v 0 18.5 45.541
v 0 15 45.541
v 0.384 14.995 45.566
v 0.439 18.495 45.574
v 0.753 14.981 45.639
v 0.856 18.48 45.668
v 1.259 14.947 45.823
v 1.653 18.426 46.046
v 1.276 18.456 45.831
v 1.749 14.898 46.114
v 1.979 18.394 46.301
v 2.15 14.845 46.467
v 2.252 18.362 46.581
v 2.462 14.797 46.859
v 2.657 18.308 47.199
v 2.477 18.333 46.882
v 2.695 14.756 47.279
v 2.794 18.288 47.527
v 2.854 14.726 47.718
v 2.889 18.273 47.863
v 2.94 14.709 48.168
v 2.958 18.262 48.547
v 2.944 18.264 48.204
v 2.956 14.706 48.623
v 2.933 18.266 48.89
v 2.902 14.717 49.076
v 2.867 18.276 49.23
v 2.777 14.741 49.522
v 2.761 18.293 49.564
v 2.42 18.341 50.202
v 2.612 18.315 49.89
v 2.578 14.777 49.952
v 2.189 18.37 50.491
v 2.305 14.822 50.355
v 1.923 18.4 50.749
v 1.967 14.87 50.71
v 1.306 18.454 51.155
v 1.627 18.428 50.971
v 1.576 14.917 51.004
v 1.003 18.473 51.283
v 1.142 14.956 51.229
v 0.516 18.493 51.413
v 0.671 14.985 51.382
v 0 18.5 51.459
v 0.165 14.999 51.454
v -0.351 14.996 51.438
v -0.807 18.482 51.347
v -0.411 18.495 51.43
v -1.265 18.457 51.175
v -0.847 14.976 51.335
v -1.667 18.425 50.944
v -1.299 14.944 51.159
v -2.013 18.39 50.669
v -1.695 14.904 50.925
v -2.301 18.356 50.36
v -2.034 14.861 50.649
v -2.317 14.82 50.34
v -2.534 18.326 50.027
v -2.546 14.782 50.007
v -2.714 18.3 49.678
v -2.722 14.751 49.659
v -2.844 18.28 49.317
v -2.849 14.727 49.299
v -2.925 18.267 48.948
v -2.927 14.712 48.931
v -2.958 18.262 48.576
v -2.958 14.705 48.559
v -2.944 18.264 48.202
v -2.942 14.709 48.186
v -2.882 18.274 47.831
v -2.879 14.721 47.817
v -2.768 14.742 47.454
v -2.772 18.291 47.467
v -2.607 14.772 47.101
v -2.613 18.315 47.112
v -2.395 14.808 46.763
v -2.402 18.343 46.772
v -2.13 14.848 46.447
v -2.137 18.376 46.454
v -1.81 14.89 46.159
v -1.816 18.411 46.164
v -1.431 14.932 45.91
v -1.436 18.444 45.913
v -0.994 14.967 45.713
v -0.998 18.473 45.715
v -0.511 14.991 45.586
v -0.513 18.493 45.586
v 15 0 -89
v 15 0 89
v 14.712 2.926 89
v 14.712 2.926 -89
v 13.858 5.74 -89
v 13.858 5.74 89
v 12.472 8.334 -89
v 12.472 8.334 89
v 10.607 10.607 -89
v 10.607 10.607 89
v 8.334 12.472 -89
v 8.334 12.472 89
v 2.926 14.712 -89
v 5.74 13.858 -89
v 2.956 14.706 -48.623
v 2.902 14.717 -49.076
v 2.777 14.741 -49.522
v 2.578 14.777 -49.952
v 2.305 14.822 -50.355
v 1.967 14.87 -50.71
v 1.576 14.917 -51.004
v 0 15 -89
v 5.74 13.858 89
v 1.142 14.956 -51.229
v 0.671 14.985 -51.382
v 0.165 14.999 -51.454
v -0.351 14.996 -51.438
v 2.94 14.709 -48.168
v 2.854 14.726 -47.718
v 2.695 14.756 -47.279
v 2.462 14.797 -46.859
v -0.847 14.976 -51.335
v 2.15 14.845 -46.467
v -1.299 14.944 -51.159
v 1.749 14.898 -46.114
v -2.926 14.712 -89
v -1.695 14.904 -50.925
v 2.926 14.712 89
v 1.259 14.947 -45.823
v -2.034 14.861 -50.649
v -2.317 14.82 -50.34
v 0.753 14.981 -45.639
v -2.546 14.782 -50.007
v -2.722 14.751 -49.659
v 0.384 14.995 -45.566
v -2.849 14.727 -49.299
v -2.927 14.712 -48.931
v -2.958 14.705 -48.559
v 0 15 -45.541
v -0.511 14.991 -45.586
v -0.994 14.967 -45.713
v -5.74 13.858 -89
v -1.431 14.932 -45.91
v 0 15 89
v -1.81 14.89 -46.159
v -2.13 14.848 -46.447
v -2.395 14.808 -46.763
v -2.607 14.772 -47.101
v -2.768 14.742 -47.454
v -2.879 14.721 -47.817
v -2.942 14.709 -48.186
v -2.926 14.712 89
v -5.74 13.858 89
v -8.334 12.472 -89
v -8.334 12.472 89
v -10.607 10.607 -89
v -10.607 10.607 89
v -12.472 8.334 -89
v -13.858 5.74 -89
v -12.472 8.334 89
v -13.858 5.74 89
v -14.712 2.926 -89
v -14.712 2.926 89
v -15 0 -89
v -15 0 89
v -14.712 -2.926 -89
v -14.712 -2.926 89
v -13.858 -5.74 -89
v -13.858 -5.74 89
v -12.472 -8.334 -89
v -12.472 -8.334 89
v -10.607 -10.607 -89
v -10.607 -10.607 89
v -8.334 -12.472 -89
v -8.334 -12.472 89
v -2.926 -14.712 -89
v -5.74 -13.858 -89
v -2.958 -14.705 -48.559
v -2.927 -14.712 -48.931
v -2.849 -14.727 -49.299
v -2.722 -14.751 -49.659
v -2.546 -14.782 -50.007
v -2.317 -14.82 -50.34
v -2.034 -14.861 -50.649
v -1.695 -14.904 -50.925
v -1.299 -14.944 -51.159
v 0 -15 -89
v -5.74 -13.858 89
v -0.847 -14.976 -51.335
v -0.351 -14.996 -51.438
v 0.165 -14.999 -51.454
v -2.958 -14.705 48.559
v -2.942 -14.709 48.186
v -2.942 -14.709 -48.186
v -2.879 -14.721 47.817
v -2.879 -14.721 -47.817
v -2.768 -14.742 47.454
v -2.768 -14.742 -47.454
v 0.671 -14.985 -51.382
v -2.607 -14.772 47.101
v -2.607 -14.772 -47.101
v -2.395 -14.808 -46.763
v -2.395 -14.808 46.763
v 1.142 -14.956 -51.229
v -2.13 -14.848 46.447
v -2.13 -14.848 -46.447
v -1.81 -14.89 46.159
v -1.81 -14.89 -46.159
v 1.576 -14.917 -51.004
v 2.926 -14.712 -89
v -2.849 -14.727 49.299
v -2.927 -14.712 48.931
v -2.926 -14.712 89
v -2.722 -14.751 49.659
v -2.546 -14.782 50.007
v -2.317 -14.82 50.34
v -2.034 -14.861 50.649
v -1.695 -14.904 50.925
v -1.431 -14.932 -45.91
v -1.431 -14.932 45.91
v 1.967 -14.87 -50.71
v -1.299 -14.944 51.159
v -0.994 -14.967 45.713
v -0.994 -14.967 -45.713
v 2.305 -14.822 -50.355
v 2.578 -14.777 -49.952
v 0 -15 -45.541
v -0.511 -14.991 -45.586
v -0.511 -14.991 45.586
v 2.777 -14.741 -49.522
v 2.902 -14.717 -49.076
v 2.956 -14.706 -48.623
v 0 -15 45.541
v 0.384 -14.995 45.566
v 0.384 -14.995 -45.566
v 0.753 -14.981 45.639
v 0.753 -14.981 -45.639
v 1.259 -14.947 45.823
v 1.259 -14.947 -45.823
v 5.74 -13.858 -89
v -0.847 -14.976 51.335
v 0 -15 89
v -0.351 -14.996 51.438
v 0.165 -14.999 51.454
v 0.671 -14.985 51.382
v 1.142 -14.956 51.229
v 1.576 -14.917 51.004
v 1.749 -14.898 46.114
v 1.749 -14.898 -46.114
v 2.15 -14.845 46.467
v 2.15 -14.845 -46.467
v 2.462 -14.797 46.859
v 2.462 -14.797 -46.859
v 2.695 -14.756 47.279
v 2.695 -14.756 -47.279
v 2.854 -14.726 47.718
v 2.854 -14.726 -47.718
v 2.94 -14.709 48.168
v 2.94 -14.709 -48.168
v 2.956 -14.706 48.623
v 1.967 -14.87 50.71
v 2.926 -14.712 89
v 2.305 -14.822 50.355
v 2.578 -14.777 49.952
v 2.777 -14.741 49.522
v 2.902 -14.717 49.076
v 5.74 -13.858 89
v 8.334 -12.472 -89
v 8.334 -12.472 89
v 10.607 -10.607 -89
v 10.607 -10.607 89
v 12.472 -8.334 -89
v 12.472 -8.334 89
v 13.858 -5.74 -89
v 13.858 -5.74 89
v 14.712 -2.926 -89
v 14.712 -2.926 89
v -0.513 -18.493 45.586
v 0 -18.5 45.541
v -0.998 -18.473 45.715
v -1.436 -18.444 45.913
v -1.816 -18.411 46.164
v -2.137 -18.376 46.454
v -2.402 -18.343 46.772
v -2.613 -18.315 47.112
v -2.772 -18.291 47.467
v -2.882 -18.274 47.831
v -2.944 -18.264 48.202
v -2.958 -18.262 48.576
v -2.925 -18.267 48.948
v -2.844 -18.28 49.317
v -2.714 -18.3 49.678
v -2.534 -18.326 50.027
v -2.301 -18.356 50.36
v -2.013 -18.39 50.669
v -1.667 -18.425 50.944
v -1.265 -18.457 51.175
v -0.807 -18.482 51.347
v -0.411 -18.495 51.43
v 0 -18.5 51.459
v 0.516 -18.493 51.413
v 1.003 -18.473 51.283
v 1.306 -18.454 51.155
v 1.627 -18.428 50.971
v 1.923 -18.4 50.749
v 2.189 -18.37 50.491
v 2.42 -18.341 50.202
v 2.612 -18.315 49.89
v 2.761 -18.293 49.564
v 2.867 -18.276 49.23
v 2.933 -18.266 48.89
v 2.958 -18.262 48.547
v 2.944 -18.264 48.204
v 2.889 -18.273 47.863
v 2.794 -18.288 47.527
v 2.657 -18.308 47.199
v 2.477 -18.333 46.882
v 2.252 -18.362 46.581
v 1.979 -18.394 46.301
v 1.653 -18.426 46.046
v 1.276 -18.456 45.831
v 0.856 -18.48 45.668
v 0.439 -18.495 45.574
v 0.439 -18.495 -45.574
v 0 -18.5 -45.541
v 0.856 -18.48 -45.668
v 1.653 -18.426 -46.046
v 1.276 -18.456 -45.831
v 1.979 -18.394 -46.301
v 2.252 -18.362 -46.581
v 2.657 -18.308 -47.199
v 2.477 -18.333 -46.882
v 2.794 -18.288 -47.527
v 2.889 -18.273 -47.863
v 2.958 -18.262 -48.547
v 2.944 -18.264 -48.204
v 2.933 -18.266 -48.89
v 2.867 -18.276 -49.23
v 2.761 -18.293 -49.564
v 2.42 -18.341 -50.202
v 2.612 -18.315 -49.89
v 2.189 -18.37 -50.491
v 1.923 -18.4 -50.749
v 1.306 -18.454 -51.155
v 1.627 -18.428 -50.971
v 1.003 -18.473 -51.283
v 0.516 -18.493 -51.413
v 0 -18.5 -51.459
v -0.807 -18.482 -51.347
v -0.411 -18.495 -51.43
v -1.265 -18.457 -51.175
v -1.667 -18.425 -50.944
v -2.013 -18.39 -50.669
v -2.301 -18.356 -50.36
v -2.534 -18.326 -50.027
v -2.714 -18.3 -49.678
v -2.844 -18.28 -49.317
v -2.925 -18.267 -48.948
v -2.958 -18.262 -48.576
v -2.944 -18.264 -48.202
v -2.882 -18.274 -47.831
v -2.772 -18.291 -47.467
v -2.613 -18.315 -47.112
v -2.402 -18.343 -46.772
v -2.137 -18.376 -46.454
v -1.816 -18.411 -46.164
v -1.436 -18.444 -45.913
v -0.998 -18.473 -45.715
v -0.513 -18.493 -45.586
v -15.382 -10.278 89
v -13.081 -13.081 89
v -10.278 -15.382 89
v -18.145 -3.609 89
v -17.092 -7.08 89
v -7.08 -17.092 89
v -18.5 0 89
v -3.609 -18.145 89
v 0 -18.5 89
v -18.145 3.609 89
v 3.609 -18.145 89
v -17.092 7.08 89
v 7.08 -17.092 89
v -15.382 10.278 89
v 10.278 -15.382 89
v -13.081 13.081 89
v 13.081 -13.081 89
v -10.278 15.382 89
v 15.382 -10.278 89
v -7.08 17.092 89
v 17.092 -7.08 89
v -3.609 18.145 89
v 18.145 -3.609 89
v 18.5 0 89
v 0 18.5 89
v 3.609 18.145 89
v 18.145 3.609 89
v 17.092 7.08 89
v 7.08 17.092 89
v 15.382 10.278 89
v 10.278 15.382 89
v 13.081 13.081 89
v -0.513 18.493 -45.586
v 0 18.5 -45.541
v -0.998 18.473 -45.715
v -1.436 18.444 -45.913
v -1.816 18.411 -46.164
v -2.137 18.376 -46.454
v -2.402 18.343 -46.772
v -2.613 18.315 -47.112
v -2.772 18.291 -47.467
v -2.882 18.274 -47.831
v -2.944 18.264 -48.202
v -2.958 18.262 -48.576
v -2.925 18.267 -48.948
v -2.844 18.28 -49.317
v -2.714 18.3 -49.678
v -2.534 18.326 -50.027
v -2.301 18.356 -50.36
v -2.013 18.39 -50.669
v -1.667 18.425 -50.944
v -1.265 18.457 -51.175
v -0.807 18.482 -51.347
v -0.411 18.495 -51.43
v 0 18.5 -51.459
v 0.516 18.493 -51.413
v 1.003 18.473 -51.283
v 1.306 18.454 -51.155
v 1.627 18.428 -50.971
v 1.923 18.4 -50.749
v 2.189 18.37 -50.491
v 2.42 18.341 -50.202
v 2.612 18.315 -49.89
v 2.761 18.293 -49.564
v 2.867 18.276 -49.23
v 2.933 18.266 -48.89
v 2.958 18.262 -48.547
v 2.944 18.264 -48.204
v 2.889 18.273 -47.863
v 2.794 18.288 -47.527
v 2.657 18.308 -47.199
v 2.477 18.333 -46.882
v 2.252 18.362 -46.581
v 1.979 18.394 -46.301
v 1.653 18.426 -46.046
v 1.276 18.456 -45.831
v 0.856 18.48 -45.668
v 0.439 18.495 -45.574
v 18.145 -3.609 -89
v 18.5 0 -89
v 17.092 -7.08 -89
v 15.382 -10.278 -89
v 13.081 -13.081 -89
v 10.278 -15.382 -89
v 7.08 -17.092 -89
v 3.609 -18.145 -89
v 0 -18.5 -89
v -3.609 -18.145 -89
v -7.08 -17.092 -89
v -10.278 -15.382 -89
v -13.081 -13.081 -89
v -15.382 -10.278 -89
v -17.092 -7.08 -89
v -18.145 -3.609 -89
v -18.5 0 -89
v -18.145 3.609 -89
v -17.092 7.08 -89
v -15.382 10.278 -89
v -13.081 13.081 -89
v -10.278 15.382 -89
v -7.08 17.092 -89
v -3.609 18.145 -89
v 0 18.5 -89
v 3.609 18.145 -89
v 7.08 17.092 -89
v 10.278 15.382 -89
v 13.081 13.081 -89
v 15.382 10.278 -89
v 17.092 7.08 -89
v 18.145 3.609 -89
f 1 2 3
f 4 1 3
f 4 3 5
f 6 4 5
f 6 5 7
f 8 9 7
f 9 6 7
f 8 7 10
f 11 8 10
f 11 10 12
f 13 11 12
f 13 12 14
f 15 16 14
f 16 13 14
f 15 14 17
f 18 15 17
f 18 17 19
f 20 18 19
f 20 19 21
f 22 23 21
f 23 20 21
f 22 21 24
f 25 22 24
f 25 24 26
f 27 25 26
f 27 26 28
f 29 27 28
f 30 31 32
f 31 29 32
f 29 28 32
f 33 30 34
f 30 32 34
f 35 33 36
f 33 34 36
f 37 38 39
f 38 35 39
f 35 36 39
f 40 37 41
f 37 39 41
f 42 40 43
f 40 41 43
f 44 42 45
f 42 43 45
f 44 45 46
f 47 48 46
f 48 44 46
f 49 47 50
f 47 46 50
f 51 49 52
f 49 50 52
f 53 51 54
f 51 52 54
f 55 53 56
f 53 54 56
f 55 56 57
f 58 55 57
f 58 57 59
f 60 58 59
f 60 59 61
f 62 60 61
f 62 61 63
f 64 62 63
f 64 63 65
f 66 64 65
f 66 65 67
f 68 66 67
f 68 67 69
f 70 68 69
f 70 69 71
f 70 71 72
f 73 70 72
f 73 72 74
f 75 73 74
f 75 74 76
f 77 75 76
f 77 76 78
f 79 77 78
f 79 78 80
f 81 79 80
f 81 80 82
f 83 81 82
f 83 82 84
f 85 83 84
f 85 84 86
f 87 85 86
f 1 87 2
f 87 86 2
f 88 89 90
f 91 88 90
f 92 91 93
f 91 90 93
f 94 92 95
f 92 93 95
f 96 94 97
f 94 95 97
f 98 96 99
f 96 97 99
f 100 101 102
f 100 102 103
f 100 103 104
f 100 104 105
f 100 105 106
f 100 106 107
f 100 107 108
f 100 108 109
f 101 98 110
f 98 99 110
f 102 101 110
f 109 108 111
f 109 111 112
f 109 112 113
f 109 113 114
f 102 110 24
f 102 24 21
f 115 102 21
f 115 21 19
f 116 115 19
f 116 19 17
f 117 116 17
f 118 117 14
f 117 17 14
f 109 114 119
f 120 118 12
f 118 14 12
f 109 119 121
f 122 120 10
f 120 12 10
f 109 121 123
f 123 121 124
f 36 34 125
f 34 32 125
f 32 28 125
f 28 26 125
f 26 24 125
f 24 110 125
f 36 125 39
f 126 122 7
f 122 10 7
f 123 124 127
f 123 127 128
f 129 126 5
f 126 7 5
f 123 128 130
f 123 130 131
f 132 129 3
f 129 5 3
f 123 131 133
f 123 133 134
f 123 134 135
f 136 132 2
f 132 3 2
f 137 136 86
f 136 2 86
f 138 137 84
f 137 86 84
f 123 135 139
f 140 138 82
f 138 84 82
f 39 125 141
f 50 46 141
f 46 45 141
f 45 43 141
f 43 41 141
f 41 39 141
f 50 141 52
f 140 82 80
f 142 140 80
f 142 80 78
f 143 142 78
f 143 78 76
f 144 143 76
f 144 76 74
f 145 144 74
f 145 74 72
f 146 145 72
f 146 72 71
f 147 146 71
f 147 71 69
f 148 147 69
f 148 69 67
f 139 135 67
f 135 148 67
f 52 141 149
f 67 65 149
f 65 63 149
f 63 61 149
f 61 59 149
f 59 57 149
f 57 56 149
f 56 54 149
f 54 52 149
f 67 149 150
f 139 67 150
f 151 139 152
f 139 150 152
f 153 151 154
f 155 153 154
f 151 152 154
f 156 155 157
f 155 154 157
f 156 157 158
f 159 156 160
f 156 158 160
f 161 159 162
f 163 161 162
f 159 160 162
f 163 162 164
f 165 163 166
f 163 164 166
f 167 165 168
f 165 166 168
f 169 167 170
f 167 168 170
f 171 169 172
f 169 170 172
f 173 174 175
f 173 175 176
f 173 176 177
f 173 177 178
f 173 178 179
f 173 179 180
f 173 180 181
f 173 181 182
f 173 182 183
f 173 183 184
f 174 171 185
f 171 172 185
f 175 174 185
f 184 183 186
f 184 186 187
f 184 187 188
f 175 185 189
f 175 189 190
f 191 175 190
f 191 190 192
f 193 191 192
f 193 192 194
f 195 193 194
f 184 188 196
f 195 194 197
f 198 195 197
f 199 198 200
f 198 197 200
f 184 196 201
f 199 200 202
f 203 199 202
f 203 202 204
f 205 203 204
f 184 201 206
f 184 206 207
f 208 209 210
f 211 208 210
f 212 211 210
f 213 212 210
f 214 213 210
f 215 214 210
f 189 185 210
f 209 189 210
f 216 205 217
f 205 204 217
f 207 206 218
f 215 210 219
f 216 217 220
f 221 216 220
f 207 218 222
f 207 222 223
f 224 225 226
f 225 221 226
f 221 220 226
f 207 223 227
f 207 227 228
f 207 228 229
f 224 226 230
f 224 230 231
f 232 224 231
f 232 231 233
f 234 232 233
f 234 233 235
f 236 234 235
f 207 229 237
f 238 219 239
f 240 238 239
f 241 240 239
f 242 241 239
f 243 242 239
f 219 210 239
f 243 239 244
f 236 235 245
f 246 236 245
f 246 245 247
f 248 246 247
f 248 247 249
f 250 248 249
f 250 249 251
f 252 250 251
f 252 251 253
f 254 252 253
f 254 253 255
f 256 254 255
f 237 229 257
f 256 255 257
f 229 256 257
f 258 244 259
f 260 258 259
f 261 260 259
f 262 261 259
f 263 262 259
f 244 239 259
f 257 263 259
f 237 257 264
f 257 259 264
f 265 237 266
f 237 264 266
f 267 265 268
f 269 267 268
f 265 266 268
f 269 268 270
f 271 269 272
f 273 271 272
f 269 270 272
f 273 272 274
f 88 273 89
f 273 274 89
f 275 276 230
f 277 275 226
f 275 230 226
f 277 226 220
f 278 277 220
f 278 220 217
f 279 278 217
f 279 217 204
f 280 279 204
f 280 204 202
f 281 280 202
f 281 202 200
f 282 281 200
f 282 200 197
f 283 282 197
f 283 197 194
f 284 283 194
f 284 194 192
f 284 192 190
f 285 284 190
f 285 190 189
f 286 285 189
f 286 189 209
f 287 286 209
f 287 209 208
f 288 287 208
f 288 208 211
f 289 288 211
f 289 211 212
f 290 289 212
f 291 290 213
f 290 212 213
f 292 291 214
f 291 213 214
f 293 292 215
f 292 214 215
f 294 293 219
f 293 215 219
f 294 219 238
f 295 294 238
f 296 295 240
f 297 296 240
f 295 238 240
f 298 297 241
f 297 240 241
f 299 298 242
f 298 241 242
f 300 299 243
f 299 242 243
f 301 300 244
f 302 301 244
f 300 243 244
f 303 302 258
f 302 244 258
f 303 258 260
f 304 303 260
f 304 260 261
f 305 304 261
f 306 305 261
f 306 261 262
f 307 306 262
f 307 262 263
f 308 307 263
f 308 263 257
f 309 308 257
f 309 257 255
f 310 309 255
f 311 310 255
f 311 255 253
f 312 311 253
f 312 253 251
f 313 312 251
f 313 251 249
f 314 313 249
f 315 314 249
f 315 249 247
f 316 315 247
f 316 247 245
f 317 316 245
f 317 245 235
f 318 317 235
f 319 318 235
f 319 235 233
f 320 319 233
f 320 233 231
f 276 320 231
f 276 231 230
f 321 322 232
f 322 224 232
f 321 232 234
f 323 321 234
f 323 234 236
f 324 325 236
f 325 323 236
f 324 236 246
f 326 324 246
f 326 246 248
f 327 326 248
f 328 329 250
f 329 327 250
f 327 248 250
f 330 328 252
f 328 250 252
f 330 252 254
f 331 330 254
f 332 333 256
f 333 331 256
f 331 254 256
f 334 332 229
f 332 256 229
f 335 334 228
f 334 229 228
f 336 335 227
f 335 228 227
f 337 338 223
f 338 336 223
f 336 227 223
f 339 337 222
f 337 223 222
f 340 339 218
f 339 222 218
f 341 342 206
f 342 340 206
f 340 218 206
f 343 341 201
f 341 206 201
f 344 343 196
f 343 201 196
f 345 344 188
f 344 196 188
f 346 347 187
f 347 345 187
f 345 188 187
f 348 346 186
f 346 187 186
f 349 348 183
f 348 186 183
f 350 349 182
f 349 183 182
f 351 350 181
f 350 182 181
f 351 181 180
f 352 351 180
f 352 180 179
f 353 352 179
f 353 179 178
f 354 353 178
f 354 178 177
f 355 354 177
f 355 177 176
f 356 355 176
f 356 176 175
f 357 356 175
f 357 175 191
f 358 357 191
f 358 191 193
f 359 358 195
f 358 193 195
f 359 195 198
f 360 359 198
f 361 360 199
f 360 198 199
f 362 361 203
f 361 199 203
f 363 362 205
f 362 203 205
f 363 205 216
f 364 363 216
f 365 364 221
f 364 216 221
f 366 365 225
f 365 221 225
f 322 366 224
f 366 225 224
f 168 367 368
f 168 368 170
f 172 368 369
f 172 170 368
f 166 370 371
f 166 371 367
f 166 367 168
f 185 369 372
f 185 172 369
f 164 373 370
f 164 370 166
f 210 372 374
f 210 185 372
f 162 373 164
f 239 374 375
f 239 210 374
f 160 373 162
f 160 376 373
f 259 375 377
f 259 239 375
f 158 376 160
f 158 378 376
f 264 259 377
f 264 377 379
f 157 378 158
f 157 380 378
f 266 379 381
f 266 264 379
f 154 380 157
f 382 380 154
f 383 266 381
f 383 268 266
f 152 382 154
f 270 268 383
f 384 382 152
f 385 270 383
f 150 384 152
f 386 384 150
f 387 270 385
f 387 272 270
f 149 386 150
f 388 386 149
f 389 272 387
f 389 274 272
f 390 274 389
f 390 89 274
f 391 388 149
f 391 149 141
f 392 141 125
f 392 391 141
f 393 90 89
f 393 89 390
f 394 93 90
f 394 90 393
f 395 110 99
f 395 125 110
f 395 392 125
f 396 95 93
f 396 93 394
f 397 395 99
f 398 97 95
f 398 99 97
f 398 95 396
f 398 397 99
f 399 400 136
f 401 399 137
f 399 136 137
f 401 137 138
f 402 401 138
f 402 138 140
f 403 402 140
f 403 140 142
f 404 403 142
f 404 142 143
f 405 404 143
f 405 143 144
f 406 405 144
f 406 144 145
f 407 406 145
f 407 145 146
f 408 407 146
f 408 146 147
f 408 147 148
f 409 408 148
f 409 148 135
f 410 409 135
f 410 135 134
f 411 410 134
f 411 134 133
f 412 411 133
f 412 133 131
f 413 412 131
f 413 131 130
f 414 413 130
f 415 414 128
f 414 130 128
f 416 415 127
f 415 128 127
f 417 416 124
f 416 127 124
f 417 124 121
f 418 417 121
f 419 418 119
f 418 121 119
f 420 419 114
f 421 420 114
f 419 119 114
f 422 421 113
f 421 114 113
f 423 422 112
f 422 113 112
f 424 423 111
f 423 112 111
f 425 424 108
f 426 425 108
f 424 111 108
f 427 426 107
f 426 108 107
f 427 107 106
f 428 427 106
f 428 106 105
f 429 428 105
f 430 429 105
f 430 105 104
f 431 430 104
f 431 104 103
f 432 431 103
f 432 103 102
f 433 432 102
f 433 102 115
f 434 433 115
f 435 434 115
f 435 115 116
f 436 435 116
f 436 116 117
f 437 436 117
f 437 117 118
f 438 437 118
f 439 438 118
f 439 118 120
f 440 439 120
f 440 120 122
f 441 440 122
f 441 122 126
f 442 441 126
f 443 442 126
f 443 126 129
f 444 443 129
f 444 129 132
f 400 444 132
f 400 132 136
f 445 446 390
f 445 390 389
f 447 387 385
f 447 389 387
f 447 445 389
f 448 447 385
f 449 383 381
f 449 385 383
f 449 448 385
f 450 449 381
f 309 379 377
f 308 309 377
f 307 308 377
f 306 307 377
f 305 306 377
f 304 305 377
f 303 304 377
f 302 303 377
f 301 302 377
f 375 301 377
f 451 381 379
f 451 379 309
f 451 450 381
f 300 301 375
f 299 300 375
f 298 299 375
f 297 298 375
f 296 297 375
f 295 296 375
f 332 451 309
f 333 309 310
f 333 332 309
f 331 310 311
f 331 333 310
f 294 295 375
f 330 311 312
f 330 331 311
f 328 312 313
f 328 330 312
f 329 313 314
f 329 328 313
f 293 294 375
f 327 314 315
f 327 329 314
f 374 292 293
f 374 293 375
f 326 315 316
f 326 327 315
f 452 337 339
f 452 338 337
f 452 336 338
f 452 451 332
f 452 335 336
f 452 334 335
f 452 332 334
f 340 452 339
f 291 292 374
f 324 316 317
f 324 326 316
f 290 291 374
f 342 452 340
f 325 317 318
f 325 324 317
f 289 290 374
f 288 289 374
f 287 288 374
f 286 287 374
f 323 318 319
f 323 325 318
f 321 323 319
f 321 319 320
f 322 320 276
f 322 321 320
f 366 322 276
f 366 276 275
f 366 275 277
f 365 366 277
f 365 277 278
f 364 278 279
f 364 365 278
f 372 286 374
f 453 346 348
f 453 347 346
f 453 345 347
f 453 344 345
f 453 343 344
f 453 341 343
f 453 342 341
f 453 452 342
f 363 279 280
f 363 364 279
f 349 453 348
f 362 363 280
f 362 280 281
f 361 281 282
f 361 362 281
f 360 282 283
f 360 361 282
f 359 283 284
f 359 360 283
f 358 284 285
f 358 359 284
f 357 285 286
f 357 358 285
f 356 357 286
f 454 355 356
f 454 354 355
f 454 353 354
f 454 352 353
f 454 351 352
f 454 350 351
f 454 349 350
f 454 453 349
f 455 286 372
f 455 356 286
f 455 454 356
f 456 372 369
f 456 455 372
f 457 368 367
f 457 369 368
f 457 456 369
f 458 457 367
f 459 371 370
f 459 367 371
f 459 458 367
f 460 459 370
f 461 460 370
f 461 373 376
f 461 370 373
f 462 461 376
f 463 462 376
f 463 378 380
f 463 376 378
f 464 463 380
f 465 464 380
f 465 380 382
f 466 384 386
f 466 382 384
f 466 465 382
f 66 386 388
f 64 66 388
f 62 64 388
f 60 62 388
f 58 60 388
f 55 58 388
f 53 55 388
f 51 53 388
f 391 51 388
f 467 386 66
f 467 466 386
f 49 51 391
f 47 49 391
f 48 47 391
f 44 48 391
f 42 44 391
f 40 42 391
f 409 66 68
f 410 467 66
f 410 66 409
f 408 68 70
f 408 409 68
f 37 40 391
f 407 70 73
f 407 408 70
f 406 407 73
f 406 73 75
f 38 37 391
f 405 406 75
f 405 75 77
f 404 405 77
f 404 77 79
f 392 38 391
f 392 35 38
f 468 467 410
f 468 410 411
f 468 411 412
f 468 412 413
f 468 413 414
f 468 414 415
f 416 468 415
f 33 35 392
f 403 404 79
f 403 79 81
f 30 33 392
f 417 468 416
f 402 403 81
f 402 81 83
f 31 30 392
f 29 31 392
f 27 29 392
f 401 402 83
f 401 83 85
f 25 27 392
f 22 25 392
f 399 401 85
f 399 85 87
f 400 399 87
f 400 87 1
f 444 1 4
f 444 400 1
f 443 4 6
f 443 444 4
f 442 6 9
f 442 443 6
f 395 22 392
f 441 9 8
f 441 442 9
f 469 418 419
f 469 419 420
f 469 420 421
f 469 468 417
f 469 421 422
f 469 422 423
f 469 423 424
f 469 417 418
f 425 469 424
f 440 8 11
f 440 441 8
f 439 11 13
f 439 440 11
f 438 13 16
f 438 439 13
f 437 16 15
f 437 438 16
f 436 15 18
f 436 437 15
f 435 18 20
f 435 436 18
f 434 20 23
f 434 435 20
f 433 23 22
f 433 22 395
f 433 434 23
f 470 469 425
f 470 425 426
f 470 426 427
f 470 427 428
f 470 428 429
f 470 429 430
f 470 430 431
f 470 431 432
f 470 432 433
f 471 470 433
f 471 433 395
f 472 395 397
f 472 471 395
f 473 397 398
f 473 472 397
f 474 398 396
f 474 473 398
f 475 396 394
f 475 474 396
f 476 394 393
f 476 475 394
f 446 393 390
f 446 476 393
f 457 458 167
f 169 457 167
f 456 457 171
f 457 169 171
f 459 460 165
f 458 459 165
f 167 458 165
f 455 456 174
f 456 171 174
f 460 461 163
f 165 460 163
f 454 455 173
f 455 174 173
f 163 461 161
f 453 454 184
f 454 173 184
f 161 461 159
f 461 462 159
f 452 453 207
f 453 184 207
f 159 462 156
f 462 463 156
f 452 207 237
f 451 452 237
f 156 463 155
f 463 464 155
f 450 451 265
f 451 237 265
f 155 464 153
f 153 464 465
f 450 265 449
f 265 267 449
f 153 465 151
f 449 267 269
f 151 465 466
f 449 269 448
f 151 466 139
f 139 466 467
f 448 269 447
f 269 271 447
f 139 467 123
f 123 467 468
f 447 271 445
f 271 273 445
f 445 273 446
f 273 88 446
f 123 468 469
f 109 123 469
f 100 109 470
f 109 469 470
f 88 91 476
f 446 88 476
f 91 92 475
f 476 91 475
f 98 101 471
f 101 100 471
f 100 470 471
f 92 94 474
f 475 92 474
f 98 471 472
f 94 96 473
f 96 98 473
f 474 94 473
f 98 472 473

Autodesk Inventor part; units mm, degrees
ref_plane "YZ Plane" through (0, 0, 0) normal (1, 0, 0) x (0, 1, 0)
ref_plane "XZ Plane" through (0, 0, 0) normal (0, 1, 0) x (-1, 0, 0)
sketch "Sketch1" plane through (0, 0, 0) normal (0, 0, 1) x (1, 0, 0)
  circle A0 centre (0, 0) radius 18.5
  circle A1 centre (0, 0) radius 15
  dimension "d0" = 37
  dimension "d1" = 30
extrude "Extrusion1" add sketch "Sketch1" along normal mid plane 178
ref_plane "Work Plane4" through (0, 18.5, 0) normal (0, 1, 0) x (-1, 0, 0)
sketch "Sketch4" plane through (0, 18.5, 0) normal (0, 1, 0) x (-1, 0, 0)
  line L0 (-18.5, -89) -> (18.5, -89) projected
  line L1 (18.5, -89) -> (18.5, 89) projected
  line L2 (-18.5, -89) -> (18.5, -89) projected
  line L3 (18.5, 89) -> (-18.5, 89) projected
  point P0 (0, 0)
  point P1 (0, -48.5)
  dimension "d14" = 40.5
  dimension "d22" = 178
  dimension "d23" = 18.5
hole "Hole1" at (0, 18.5, -48.5) direction (0, -1, 0) diameter 5.9175 depth 19.1 tip angle 118 thread size "M7x1" class "6H" standard "ISO Metric profile"
mirror "Mirror1" about plane through (0, 0, 0) normal (0, 0, 1) of "Hole1"
mirror "Mirror2" about plane through (0, 0, 0) normal (0, 1, 0) of "Hole1", "Mirror1"
properties part number "EjeRodilla"
